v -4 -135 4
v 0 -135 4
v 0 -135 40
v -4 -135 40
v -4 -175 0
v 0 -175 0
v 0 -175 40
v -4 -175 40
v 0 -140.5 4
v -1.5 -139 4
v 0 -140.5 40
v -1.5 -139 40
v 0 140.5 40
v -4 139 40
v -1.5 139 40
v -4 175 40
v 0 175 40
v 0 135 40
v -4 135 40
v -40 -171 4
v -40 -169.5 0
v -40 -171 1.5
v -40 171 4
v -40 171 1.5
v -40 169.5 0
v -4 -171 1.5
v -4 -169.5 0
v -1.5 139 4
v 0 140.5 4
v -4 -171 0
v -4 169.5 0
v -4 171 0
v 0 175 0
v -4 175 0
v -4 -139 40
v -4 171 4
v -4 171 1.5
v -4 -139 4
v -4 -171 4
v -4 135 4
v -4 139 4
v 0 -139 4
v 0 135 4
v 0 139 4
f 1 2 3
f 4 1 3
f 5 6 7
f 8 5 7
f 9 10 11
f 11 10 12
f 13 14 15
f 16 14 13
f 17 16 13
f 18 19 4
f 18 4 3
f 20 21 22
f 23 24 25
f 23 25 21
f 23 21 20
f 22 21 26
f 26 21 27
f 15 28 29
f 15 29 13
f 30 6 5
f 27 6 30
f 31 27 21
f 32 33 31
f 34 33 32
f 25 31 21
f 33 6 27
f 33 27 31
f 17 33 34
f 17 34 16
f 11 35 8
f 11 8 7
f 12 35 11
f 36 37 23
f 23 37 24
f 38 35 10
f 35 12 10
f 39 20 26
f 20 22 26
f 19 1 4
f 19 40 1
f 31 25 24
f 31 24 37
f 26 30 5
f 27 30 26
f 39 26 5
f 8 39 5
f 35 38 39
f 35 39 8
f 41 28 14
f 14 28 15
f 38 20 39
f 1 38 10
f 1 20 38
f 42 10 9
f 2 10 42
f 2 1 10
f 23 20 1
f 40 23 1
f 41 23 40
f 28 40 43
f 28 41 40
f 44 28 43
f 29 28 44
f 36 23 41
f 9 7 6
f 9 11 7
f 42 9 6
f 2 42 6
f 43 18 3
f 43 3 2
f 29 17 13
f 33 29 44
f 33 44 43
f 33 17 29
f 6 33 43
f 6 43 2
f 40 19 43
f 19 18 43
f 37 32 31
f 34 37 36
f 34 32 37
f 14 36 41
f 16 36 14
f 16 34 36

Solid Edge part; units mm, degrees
sketch "Sketch1" plane through (-9.04, 0, 33.0648) normal (0, -1, 0) x (1, 0, 0)
  line L0 (-30.96, -29.0648) -> (5.04, -29.0648)
  line L1 (5.04, -29.0648) -> (5.04, 6.9352)
  line L2 (5.04, 6.9352) -> (9.04, 6.9352)
  line L3 (9.04, 6.9352) -> (9.04, -33.0648)
  line L4 (9.04, -33.0648) -> (-30.96, -33.0648)
  line L5 (-30.96, -33.0648) -> (-30.96, -29.0648)
extrude "Protrusion1" add sketch "Sketch1" along normal mid plane 350
sketch "Sketch2" plane through (-20, 0, 0) normal (0, 0, -1) x (0, 1, 0)
  line L0 (-175, -20) -> (-171, -20)
  line L1 (-171, -20) -> (-171, 16)
  line L2 (-171, 16) -> (-175, 16)
  line L3 (-175, 16) -> (-175, -20)
  dimension "D1" = 4
extrude "Cutout1" cut sketch "Sketch2" against normal up to next
sketch "Sketch3" plane through (0, 0, 20) normal (1, 0, 0) x (0, 1, 0)
  line L0 (-139, -16) -> (-135, -16)
  line L1 (-135, -16) -> (-135, 20)
  line L2 (-135, 20) -> (-139, 20)
  line L3 (-139, 20) -> (-139, -16)
  dimension "D1" = 4
  dimension "D2" = 40
extrude "Cutout2" cut sketch "Sketch3" against normal up to next
mirror "Mirror1" about plane through (0, 0, 0) normal (0, -1, 0) of "Cutout1", "Cutout2"
chamfer "Fase_3" distance 1.5 angle 45 4 edges at (0, -139, 22) (-22, -171, 0) (-22, 171, 0) (0, 139, 22)
